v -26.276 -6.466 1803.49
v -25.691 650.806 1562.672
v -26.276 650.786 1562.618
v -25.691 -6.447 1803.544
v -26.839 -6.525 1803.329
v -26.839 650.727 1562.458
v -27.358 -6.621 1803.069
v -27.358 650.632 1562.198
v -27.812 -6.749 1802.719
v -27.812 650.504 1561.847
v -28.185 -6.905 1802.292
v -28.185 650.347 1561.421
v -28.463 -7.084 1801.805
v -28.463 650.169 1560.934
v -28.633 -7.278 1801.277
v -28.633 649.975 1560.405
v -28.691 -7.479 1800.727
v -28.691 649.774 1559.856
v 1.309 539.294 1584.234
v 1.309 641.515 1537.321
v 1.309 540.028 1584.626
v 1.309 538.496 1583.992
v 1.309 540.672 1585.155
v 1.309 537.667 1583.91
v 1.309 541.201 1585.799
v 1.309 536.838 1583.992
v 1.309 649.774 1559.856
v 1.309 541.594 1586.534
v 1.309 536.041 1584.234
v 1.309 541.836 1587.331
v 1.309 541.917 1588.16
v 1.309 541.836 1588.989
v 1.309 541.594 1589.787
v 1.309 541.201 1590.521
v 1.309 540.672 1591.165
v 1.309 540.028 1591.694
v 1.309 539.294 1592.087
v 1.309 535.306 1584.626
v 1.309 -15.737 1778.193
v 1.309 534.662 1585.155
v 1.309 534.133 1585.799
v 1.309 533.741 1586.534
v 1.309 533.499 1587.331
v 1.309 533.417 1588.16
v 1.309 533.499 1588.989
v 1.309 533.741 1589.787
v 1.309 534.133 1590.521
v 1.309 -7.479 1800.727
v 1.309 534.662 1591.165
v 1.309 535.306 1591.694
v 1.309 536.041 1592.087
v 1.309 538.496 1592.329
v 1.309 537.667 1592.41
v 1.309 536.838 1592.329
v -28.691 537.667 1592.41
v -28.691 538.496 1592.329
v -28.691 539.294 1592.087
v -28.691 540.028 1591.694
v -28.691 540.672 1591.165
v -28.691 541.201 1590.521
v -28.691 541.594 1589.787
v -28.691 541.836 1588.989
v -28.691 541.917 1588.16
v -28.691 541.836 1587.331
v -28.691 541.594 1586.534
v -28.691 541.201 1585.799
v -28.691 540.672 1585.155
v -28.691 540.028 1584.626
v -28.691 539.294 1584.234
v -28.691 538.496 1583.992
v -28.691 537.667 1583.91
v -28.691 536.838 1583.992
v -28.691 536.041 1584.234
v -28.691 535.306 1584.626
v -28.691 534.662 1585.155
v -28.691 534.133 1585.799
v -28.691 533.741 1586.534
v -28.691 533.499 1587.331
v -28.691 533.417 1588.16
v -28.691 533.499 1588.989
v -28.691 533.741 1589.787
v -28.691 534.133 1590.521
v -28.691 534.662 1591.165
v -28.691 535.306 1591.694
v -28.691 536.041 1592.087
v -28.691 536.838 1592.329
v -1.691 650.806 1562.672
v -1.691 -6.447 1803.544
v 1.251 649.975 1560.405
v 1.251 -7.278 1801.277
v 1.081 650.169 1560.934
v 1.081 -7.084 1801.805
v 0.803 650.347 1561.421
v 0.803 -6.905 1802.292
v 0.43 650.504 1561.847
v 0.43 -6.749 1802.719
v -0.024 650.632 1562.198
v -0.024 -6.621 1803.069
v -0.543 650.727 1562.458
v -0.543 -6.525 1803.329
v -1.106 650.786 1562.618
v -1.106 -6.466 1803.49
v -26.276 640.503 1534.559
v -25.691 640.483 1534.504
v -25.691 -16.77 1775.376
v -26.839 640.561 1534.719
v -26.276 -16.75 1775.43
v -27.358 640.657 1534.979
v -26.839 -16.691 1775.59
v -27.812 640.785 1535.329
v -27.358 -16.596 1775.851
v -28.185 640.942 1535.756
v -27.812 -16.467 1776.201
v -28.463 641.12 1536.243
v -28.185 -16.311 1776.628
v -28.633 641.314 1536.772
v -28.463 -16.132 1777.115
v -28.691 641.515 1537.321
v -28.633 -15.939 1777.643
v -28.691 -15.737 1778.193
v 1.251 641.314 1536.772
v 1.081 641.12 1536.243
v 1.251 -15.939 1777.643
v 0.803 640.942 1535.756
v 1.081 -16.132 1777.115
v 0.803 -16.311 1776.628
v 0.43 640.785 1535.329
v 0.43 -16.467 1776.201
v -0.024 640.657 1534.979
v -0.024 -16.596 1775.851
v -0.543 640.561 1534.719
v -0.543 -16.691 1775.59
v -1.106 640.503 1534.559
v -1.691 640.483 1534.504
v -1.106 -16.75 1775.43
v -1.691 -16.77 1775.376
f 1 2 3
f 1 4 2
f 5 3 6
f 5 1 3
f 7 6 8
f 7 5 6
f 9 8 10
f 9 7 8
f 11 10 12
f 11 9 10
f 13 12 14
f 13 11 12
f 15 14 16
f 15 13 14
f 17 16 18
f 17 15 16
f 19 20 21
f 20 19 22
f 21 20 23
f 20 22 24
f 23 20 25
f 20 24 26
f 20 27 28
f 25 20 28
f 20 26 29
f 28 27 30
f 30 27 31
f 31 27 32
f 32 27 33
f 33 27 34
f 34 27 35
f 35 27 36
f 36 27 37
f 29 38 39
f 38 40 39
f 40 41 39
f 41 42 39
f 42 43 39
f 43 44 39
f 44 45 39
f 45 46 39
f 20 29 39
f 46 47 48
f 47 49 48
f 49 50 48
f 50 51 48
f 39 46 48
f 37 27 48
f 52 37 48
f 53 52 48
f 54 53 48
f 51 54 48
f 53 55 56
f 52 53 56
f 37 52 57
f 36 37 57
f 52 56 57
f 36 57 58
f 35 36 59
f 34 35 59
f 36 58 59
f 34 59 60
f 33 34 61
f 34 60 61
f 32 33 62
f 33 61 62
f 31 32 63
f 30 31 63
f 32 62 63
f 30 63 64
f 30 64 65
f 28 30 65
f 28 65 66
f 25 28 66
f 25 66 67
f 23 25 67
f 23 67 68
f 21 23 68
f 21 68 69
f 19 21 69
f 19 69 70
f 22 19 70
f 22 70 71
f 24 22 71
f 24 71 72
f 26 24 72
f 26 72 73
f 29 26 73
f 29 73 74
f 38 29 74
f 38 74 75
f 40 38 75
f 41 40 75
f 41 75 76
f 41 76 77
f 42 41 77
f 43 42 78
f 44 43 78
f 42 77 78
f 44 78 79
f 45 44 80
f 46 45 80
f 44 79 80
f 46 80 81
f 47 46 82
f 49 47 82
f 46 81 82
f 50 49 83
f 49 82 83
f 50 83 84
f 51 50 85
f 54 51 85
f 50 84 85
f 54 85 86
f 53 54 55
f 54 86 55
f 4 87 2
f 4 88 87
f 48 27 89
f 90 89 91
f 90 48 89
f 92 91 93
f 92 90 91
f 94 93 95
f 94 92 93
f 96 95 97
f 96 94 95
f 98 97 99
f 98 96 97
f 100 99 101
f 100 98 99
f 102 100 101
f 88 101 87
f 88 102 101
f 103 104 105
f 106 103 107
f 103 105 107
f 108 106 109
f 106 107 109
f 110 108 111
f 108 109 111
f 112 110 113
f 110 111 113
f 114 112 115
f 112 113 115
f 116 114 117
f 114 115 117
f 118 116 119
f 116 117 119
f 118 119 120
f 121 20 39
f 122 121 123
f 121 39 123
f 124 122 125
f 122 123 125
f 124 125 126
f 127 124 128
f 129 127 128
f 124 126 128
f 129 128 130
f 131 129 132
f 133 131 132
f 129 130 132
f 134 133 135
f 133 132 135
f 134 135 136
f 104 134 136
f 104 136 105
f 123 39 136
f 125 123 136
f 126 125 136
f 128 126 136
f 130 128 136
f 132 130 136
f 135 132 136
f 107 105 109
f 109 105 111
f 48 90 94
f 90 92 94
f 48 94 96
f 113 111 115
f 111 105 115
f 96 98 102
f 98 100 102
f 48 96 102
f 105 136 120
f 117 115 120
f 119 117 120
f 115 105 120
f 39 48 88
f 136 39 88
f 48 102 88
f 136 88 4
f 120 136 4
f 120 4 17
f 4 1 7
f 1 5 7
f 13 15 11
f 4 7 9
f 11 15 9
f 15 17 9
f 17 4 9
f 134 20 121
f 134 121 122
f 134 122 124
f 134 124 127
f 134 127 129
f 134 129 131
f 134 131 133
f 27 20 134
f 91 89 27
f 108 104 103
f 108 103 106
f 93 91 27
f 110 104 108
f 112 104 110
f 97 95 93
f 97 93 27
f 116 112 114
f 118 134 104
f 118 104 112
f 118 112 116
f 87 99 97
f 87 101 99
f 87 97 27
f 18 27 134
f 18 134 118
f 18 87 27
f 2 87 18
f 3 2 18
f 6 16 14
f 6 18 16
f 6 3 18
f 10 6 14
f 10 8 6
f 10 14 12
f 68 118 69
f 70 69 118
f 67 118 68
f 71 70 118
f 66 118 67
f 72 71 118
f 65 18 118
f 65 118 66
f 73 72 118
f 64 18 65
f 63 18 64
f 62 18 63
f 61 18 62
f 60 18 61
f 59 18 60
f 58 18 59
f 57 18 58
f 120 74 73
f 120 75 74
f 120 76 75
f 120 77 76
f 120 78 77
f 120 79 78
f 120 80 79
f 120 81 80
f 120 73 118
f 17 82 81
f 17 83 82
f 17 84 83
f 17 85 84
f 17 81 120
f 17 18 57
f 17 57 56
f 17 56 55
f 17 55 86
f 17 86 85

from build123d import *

# Parameters (mm, degrees)
SKETCH1_W                  = 30
SKETCH1_H                  = 700
BOSS_EXTRUDE1_DEPTH        = 30
F_8_5_8_5_DIAMETER_HOLE1_D = 8.5
FILLET1_R                  = 3


with BuildPart() as part:
    # Sketch1 → Boss-Extrude1 (new body)
    with BuildSketch(Plane(origin=(0, 581.941084715, 1587.910176451), x_dir=(-1, 0, 0), z_dir=(0, 0.3441021099188428, 0.9389322328844616))):
        with Locations((13.69090897, 276.656236502)):
            Rectangle(SKETCH1_W, SKETCH1_H)
    extrude(amount=-BOSS_EXTRUDE1_DEPTH)

    # Ø8.5 (8.5) Diameter Hole1 (through all)
    with Locations(Plane(origin=(1.30909103, 0, 0), x_dir=(0, 0, -1), z_dir=(1, 0, 0))):
        with Locations((-1588.160191829, 537.667169913)):
            Hole(F_8_5_8_5_DIAMETER_HOLE1_D / 2)

    # Fillet1
    fillet1_edges = [part.edges().sort_by_distance(p)[0] for p in [
        (1.30909103, 311.856563537, 1654.940204167),
        (-28.69090897, 311.856563537, 1654.940204167),
        (1.30909103, 322.179626834, 1683.108171153),
        (-28.69090897, 322.179626834, 1683.108171153),
    ]]
    fillet(fillet1_edges, radius=FILLET1_R)


solid = part.part
